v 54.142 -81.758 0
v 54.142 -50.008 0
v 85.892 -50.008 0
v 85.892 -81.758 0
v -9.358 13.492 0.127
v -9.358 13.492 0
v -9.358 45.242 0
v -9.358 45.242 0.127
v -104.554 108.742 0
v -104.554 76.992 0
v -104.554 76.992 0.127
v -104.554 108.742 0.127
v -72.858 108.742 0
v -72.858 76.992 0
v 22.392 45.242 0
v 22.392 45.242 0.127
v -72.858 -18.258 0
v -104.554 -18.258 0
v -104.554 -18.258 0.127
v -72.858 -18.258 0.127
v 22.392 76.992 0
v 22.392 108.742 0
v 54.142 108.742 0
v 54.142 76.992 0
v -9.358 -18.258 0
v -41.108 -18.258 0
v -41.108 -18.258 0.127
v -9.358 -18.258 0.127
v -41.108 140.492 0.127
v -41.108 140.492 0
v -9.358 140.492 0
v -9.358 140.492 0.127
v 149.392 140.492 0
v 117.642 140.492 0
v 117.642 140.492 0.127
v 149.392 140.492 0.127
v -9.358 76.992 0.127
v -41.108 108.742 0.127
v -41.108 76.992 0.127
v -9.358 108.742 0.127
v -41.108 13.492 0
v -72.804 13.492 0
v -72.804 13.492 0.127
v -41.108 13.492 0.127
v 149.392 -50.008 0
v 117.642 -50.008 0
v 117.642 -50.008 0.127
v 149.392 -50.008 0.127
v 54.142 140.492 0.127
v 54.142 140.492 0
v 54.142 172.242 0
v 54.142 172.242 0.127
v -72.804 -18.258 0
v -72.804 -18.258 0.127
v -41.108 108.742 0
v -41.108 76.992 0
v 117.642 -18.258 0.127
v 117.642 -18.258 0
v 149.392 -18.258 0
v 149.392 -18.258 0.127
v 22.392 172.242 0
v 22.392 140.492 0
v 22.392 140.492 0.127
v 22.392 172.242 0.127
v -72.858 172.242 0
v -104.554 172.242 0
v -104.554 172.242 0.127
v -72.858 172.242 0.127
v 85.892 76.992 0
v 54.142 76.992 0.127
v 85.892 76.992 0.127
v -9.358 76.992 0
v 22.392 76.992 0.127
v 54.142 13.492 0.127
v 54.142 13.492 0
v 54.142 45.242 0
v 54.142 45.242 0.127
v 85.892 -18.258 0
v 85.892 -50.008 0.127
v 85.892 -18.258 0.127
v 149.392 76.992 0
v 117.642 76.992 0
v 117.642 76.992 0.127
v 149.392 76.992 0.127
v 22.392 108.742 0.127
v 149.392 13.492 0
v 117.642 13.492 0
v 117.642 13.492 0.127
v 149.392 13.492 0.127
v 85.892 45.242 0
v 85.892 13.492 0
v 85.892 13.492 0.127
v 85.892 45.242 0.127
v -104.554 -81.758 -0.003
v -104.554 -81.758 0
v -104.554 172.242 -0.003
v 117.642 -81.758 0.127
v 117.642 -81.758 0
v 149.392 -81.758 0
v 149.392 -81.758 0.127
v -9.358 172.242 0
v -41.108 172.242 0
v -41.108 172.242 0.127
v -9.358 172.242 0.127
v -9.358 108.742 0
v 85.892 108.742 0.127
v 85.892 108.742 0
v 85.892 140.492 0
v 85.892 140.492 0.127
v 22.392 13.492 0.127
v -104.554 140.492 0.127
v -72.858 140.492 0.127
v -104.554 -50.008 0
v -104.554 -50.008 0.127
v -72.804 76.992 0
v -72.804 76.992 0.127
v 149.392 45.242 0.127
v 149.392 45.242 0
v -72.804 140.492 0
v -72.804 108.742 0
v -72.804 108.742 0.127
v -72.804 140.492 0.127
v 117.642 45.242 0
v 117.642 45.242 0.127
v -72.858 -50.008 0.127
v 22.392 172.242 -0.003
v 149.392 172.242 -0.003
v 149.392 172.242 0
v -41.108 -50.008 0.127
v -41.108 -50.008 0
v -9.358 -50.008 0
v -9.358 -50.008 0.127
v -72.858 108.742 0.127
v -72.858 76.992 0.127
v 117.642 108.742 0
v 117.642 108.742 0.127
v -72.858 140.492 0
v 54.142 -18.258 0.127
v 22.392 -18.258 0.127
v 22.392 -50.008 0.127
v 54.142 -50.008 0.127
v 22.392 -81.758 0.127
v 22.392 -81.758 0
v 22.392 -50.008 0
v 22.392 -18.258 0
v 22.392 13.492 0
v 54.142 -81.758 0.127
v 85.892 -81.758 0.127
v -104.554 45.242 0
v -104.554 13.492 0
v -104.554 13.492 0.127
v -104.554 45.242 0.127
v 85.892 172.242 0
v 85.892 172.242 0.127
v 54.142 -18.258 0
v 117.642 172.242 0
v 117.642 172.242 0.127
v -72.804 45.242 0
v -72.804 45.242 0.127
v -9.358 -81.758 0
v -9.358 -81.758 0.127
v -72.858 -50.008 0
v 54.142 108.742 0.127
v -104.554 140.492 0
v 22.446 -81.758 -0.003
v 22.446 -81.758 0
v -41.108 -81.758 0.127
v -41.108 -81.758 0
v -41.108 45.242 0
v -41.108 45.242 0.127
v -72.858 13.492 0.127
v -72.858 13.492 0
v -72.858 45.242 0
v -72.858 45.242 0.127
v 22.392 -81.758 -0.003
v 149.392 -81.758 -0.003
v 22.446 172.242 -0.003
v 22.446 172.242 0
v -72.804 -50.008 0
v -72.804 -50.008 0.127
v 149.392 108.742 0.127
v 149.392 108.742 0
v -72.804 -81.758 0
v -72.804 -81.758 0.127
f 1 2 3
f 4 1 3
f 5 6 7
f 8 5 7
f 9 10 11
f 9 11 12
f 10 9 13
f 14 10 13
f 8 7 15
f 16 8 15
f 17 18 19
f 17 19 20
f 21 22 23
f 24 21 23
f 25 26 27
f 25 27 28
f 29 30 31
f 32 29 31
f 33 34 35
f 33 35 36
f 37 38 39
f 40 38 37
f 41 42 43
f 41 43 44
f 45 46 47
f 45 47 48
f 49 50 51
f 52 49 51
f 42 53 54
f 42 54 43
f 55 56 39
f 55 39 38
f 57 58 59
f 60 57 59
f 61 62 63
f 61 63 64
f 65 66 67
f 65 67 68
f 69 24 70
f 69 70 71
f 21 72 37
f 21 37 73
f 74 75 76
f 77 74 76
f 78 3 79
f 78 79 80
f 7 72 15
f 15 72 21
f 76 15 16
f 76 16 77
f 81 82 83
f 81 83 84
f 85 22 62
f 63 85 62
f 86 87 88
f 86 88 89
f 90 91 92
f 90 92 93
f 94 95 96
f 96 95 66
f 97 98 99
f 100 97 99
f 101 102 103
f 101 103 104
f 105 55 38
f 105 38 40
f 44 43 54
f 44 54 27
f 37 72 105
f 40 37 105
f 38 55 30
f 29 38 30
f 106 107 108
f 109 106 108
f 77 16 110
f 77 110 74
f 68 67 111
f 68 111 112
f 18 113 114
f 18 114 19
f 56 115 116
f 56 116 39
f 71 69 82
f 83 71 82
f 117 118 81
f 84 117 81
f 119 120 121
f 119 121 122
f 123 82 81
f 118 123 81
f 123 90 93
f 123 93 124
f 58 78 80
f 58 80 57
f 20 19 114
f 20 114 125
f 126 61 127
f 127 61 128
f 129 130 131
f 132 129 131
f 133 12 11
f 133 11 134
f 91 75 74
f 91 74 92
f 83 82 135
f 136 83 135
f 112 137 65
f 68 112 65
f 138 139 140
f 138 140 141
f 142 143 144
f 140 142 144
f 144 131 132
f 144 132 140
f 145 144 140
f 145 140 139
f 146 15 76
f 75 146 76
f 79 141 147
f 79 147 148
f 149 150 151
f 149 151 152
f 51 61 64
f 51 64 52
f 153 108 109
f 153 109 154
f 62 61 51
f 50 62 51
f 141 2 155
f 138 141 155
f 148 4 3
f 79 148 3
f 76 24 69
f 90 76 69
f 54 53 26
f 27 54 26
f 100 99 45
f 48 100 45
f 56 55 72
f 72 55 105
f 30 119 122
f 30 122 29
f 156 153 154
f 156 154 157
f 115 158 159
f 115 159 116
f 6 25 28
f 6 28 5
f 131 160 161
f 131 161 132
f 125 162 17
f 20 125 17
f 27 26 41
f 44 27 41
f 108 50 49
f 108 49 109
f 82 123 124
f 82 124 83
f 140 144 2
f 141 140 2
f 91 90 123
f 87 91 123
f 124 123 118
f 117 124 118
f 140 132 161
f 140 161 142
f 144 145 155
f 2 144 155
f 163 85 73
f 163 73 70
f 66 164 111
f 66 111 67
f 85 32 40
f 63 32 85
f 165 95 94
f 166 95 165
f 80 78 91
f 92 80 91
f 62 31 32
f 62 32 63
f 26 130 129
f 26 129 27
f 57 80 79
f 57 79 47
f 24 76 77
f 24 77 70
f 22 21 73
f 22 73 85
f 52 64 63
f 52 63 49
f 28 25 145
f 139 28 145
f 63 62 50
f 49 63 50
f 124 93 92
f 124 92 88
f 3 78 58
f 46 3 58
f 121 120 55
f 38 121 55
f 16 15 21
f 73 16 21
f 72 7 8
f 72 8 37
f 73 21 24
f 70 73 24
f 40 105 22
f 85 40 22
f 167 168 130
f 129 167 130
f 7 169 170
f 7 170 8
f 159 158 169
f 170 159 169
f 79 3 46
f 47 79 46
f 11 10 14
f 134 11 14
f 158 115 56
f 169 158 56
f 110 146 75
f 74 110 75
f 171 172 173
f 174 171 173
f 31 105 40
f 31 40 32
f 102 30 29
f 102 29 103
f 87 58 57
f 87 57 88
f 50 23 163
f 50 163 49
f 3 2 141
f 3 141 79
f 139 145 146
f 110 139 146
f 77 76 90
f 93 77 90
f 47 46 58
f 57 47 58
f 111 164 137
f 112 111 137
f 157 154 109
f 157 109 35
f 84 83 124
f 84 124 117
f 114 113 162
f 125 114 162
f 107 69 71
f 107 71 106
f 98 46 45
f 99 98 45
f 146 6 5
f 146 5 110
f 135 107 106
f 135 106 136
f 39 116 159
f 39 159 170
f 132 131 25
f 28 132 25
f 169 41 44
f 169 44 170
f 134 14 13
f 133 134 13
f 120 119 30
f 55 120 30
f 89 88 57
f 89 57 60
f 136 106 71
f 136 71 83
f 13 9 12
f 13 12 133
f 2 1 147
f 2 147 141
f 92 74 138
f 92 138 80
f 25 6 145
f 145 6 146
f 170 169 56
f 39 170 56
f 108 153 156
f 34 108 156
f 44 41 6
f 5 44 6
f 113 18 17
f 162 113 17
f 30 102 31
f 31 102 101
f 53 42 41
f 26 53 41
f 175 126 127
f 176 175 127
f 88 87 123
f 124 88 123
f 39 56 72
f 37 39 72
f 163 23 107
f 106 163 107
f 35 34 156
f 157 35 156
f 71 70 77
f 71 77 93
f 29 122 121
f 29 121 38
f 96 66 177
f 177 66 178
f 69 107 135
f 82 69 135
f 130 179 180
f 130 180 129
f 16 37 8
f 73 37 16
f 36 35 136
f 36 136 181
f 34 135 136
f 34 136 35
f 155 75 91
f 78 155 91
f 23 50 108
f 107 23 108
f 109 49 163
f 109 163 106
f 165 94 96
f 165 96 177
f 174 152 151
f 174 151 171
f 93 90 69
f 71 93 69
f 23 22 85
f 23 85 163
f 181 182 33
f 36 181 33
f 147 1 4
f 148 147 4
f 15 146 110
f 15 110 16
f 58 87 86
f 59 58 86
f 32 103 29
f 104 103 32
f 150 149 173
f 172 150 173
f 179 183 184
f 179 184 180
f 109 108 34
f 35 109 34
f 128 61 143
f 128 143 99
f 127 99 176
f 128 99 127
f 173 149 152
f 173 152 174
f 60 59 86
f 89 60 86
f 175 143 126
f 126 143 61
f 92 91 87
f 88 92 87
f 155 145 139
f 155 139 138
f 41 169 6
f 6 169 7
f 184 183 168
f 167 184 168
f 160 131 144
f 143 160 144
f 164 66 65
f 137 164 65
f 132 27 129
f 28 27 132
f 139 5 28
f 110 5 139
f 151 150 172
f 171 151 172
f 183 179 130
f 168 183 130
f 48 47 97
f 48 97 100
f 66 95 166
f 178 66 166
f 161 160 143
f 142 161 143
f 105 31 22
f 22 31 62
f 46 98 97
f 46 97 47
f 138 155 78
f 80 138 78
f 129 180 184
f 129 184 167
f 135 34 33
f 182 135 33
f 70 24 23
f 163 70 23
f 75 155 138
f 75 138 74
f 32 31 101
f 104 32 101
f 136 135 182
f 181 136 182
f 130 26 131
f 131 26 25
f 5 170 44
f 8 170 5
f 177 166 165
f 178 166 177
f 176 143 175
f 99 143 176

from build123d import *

# Parameters (mm, degrees)
F0_W     = 31.6957823275
F0_H     = 31.75
F1_DEPTH = 0.127
F0_W_2   = 31.75
F2_W     = 127
F2_H     = 254
F3_DEPTH = 0.00254
F4_W     = 127
F4_H     = 254
F5_DEPTH = 0.00254


with BuildPart() as f1:
    # F0 (on Top) → F1 (new body)
    with BuildSketch(Plane.XY):
        with Locations((-88.7057874083, 156.3674052)):
            Rectangle(F0_W, F0_H)
    extrude(amount=F1_DEPTH)


with BuildPart() as f1b:
    # F0 (on Top) → F1, piece 2 (new body)
    with BuildSketch(Plane.XY):
        with Locations((-56.9557874083, 124.6174052)):
            Rectangle(F0_W, F0_H)
    extrude(amount=F1_DEPTH)


with BuildPart() as f1c:
    # F0 (on Top) → F1, piece 3 (new body)
    with BuildSketch(Plane.XY):
        with Locations((-25.2328962445, 156.3674052)):
            Rectangle(F0_W_2, F0_H)
    extrude(amount=F1_DEPTH)


with BuildPart() as f1d:
    # F0 (on Top) → F1, piece 4 (new body)
    with BuildSketch(Plane.XY):
        with Locations((6.5171037555, 124.6174052)):
            Rectangle(F0_W_2, F0_H)
    extrude(amount=F1_DEPTH)


with BuildPart() as f1e:
    # F0 (on Top) → F1, piece 5 (new body)
    with BuildSketch(Plane.XY):
        with Locations((38.2671037555, 156.3674052)):
            Rectangle(F0_W_2, F0_H)
    extrude(amount=F1_DEPTH)


with BuildPart() as f1f:
    # F0 (on Top) → F1, piece 6 (new body)
    with BuildSketch(Plane.XY):
        with Locations((70.0171037555, 124.6174052)):
            Rectangle(F0_W_2, F0_H)
    extrude(amount=F1_DEPTH)


with BuildPart() as f1g:
    # F0 (on Top) → F1, piece 7 (new body)
    with BuildSketch(Plane.XY):
        with Locations((101.7671037555, 156.3674052)):
            Rectangle(F0_W_2, F0_H)
    extrude(amount=F1_DEPTH)


with BuildPart() as f1h:
    # F0 (on Top) → F1, piece 8 (new body)
    with BuildSketch(Plane.XY):
        with Locations((133.5171037555, 124.6174052)):
            Rectangle(F0_W_2, F0_H)
    extrude(amount=F1_DEPTH)


with BuildPart() as f1i:
    # F0 (on Top) → F1, piece 9 (new body)
    with BuildSketch(Plane.XY):
        with Locations((101.7671037555, 92.8674052)):
            Rectangle(F0_W_2, F0_H)
    extrude(amount=F1_DEPTH)


with BuildPart() as f1j:
    # F0 (on Top) → F1, piece 10 (new body)
    with BuildSketch(Plane.XY):
        with Locations((70.0171037555, 61.1174052)):
            Rectangle(F0_W_2, F0_H)
    extrude(amount=F1_DEPTH)


with BuildPart() as f1k:
    # F0 (on Top) → F1, piece 11 (new body)
    with BuildSketch(Plane.XY):
        with Locations((38.2671037555, 92.8674052)):
            Rectangle(F0_W_2, F0_H)
    extrude(amount=F1_DEPTH)


with BuildPart() as f1l:
    # F0 (on Top) → F1, piece 12 (new body)
    with BuildSketch(Plane.XY):
        with Locations((6.5171037555, 61.1174052)):
            Rectangle(F0_W_2, F0_H)
    extrude(amount=F1_DEPTH)


with BuildPart() as f1m:
    # F0 (on Top) → F1, piece 13 (new body)
    with BuildSketch(Plane.XY):
        with Locations((-25.2328962445, 92.8674052)):
            Rectangle(F0_W_2, F0_H)
    extrude(amount=F1_DEPTH)


with BuildPart() as f1n:
    # F0 (on Top) → F1, piece 14 (new body)
    with BuildSketch(Plane.XY):
        with Locations((-56.9557874083, 61.1174052)):
            Rectangle(F0_W, F0_H)
    extrude(amount=F1_DEPTH)


with BuildPart() as f1o:
    # F0 (on Top) → F1, piece 15 (new body)
    with BuildSketch(Plane.XY):
        with Locations((-88.7057874083, 92.8674052)):
            Rectangle(F0_W, F0_H)
    extrude(amount=F1_DEPTH)


with BuildPart() as f1p:
    # F0 (on Top) → F1, piece 16 (new body)
    with BuildSketch(Plane.XY):
        with Locations((-88.7057874083, 29.3674052)):
            Rectangle(F0_W, F0_H)
    extrude(amount=F1_DEPTH)


with BuildPart() as f1q:
    # F0 (on Top) → F1, piece 17 (new body)
    with BuildSketch(Plane.XY):
        with Locations((-56.9557874083, -2.3825948)):
            Rectangle(F0_W, F0_H)
    extrude(amount=F1_DEPTH)


with BuildPart() as f1r:
    # F0 (on Top) → F1, piece 18 (new body)
    with BuildSketch(Plane.XY):
        with Locations((-25.2328962445, 29.3674052)):
            Rectangle(F0_W_2, F0_H)
    extrude(amount=F1_DEPTH)


with BuildPart() as f1s:
    # F0 (on Top) → F1, piece 19 (new body)
    with BuildSketch(Plane.XY):
        with Locations((6.5171037555, -2.3825948)):
            Rectangle(F0_W_2, F0_H)
    extrude(amount=F1_DEPTH)


with BuildPart() as f1t:
    # F0 (on Top) → F1, piece 20 (new body)
    with BuildSketch(Plane.XY):
        with Locations((38.2671037555, 29.3674052)):
            Rectangle(F0_W_2, F0_H)
    extrude(amount=F1_DEPTH)


with BuildPart() as f1u:
    # F0 (on Top) → F1, piece 21 (new body)
    with BuildSketch(Plane.XY):
        with Locations((70.0171037555, -2.3825948)):
            Rectangle(F0_W_2, F0_H)
    extrude(amount=F1_DEPTH)


with BuildPart() as f1v:
    # F0 (on Top) → F1, piece 22 (new body)
    with BuildSketch(Plane.XY):
        with Locations((101.7671037555, 29.3674052)):
            Rectangle(F0_W_2, F0_H)
    extrude(amount=F1_DEPTH)


with BuildPart() as f1w:
    # F0 (on Top) → F1, piece 23 (new body)
    with BuildSketch(Plane.XY):
        with Locations((133.5171037555, -2.3825948)):
            Rectangle(F0_W_2, F0_H)
    extrude(amount=F1_DEPTH)


with BuildPart() as f1x:
    # F0 (on Top) → F1, piece 24 (new body)
    with BuildSketch(Plane.XY):
        with Locations((133.5171037555, 61.1174052)):
            Rectangle(F0_W_2, F0_H)
    extrude(amount=F1_DEPTH)


with BuildPart() as f1y:
    # F0 (on Top) → F1, piece 25 (new body)
    with BuildSketch(Plane.XY):
        with Locations((-88.7057874083, -34.1325948)):
            Rectangle(F0_W, F0_H)
    extrude(amount=F1_DEPTH)


with BuildPart() as f1z:
    # F0 (on Top) → F1, piece 26 (new body)
    with BuildSketch(Plane.XY):
        with Locations((-56.9557874083, -65.8825948)):
            Rectangle(F0_W, F0_H)
    extrude(amount=F1_DEPTH)


with BuildPart() as f1ba:
    # F0 (on Top) → F1, piece 27 (new body)
    with BuildSketch(Plane.XY):
        with Locations((-25.2328962445, -34.1325948)):
            Rectangle(F0_W_2, F0_H)
    extrude(amount=F1_DEPTH)


with BuildPart() as f1bb:
    # F0 (on Top) → F1, piece 28 (new body)
    with BuildSketch(Plane.XY):
        with Locations((6.5171037555, -65.8825948)):
            Rectangle(F0_W_2, F0_H)
    extrude(amount=F1_DEPTH)


with BuildPart() as f1bc:
    # F0 (on Top) → F1, piece 29 (new body)
    with BuildSketch(Plane.XY):
        with Locations((70.0171037555, -65.8825948)):
            Rectangle(F0_W_2, F0_H)
    extrude(amount=F1_DEPTH)


with BuildPart() as f1bd:
    # F0 (on Top) → F1, piece 30 (new body)
    with BuildSketch(Plane.XY):
        with Locations((133.5171037555, -65.8825948)):
            Rectangle(F0_W_2, F0_H)
    extrude(amount=F1_DEPTH)


with BuildPart() as f1be:
    # F0 (on Top) → F1, piece 31 (new body)
    with BuildSketch(Plane.XY):
        with Locations((38.2671037555, -34.1325948)):
            Rectangle(F0_W_2, F0_H)
    extrude(amount=F1_DEPTH)


with BuildPart() as f1bf:
    # F0 (on Top) → F1, piece 32 (new body)
    with BuildSketch(Plane.XY):
        with Locations((101.7671037555, -34.1325948)):
            Rectangle(F0_W_2, F0_H)
    extrude(amount=F1_DEPTH)


with BuildPart() as f3:
    # F2 (on Top) → F3 (new body)
    with BuildSketch(Plane.XY):
        with Locations((85.8921037555, 45.2424052)):
            Rectangle(F2_W, F2_H)
    extrude(amount=-F3_DEPTH)


with BuildPart() as f5:
    # F4 (on Top) → F5 (new body)
    with BuildSketch(Plane.XY):
        with Locations((-41.0536785721, 45.2424052)):
            Rectangle(F4_W, F4_H)
    extrude(amount=-F5_DEPTH)


solid = Compound([f1.part, f1b.part, f1c.part, f1d.part, f1e.part, f1f.part, f1g.part, f1h.part, f1i.part, f1j.part, f1k.part, f1l.part, f1m.part, f1n.part, f1o.part, f1p.part, f1q.part, f1r.part, f1s.part, f1t.part, f1u.part, f1v.part, f1w.part, f1x.part, f1y.part, f1z.part, f1ba.part, f1bb.part, f1bc.part, f1bd.part, f1be.part, f1bf.part, f3.part, f5.part])
